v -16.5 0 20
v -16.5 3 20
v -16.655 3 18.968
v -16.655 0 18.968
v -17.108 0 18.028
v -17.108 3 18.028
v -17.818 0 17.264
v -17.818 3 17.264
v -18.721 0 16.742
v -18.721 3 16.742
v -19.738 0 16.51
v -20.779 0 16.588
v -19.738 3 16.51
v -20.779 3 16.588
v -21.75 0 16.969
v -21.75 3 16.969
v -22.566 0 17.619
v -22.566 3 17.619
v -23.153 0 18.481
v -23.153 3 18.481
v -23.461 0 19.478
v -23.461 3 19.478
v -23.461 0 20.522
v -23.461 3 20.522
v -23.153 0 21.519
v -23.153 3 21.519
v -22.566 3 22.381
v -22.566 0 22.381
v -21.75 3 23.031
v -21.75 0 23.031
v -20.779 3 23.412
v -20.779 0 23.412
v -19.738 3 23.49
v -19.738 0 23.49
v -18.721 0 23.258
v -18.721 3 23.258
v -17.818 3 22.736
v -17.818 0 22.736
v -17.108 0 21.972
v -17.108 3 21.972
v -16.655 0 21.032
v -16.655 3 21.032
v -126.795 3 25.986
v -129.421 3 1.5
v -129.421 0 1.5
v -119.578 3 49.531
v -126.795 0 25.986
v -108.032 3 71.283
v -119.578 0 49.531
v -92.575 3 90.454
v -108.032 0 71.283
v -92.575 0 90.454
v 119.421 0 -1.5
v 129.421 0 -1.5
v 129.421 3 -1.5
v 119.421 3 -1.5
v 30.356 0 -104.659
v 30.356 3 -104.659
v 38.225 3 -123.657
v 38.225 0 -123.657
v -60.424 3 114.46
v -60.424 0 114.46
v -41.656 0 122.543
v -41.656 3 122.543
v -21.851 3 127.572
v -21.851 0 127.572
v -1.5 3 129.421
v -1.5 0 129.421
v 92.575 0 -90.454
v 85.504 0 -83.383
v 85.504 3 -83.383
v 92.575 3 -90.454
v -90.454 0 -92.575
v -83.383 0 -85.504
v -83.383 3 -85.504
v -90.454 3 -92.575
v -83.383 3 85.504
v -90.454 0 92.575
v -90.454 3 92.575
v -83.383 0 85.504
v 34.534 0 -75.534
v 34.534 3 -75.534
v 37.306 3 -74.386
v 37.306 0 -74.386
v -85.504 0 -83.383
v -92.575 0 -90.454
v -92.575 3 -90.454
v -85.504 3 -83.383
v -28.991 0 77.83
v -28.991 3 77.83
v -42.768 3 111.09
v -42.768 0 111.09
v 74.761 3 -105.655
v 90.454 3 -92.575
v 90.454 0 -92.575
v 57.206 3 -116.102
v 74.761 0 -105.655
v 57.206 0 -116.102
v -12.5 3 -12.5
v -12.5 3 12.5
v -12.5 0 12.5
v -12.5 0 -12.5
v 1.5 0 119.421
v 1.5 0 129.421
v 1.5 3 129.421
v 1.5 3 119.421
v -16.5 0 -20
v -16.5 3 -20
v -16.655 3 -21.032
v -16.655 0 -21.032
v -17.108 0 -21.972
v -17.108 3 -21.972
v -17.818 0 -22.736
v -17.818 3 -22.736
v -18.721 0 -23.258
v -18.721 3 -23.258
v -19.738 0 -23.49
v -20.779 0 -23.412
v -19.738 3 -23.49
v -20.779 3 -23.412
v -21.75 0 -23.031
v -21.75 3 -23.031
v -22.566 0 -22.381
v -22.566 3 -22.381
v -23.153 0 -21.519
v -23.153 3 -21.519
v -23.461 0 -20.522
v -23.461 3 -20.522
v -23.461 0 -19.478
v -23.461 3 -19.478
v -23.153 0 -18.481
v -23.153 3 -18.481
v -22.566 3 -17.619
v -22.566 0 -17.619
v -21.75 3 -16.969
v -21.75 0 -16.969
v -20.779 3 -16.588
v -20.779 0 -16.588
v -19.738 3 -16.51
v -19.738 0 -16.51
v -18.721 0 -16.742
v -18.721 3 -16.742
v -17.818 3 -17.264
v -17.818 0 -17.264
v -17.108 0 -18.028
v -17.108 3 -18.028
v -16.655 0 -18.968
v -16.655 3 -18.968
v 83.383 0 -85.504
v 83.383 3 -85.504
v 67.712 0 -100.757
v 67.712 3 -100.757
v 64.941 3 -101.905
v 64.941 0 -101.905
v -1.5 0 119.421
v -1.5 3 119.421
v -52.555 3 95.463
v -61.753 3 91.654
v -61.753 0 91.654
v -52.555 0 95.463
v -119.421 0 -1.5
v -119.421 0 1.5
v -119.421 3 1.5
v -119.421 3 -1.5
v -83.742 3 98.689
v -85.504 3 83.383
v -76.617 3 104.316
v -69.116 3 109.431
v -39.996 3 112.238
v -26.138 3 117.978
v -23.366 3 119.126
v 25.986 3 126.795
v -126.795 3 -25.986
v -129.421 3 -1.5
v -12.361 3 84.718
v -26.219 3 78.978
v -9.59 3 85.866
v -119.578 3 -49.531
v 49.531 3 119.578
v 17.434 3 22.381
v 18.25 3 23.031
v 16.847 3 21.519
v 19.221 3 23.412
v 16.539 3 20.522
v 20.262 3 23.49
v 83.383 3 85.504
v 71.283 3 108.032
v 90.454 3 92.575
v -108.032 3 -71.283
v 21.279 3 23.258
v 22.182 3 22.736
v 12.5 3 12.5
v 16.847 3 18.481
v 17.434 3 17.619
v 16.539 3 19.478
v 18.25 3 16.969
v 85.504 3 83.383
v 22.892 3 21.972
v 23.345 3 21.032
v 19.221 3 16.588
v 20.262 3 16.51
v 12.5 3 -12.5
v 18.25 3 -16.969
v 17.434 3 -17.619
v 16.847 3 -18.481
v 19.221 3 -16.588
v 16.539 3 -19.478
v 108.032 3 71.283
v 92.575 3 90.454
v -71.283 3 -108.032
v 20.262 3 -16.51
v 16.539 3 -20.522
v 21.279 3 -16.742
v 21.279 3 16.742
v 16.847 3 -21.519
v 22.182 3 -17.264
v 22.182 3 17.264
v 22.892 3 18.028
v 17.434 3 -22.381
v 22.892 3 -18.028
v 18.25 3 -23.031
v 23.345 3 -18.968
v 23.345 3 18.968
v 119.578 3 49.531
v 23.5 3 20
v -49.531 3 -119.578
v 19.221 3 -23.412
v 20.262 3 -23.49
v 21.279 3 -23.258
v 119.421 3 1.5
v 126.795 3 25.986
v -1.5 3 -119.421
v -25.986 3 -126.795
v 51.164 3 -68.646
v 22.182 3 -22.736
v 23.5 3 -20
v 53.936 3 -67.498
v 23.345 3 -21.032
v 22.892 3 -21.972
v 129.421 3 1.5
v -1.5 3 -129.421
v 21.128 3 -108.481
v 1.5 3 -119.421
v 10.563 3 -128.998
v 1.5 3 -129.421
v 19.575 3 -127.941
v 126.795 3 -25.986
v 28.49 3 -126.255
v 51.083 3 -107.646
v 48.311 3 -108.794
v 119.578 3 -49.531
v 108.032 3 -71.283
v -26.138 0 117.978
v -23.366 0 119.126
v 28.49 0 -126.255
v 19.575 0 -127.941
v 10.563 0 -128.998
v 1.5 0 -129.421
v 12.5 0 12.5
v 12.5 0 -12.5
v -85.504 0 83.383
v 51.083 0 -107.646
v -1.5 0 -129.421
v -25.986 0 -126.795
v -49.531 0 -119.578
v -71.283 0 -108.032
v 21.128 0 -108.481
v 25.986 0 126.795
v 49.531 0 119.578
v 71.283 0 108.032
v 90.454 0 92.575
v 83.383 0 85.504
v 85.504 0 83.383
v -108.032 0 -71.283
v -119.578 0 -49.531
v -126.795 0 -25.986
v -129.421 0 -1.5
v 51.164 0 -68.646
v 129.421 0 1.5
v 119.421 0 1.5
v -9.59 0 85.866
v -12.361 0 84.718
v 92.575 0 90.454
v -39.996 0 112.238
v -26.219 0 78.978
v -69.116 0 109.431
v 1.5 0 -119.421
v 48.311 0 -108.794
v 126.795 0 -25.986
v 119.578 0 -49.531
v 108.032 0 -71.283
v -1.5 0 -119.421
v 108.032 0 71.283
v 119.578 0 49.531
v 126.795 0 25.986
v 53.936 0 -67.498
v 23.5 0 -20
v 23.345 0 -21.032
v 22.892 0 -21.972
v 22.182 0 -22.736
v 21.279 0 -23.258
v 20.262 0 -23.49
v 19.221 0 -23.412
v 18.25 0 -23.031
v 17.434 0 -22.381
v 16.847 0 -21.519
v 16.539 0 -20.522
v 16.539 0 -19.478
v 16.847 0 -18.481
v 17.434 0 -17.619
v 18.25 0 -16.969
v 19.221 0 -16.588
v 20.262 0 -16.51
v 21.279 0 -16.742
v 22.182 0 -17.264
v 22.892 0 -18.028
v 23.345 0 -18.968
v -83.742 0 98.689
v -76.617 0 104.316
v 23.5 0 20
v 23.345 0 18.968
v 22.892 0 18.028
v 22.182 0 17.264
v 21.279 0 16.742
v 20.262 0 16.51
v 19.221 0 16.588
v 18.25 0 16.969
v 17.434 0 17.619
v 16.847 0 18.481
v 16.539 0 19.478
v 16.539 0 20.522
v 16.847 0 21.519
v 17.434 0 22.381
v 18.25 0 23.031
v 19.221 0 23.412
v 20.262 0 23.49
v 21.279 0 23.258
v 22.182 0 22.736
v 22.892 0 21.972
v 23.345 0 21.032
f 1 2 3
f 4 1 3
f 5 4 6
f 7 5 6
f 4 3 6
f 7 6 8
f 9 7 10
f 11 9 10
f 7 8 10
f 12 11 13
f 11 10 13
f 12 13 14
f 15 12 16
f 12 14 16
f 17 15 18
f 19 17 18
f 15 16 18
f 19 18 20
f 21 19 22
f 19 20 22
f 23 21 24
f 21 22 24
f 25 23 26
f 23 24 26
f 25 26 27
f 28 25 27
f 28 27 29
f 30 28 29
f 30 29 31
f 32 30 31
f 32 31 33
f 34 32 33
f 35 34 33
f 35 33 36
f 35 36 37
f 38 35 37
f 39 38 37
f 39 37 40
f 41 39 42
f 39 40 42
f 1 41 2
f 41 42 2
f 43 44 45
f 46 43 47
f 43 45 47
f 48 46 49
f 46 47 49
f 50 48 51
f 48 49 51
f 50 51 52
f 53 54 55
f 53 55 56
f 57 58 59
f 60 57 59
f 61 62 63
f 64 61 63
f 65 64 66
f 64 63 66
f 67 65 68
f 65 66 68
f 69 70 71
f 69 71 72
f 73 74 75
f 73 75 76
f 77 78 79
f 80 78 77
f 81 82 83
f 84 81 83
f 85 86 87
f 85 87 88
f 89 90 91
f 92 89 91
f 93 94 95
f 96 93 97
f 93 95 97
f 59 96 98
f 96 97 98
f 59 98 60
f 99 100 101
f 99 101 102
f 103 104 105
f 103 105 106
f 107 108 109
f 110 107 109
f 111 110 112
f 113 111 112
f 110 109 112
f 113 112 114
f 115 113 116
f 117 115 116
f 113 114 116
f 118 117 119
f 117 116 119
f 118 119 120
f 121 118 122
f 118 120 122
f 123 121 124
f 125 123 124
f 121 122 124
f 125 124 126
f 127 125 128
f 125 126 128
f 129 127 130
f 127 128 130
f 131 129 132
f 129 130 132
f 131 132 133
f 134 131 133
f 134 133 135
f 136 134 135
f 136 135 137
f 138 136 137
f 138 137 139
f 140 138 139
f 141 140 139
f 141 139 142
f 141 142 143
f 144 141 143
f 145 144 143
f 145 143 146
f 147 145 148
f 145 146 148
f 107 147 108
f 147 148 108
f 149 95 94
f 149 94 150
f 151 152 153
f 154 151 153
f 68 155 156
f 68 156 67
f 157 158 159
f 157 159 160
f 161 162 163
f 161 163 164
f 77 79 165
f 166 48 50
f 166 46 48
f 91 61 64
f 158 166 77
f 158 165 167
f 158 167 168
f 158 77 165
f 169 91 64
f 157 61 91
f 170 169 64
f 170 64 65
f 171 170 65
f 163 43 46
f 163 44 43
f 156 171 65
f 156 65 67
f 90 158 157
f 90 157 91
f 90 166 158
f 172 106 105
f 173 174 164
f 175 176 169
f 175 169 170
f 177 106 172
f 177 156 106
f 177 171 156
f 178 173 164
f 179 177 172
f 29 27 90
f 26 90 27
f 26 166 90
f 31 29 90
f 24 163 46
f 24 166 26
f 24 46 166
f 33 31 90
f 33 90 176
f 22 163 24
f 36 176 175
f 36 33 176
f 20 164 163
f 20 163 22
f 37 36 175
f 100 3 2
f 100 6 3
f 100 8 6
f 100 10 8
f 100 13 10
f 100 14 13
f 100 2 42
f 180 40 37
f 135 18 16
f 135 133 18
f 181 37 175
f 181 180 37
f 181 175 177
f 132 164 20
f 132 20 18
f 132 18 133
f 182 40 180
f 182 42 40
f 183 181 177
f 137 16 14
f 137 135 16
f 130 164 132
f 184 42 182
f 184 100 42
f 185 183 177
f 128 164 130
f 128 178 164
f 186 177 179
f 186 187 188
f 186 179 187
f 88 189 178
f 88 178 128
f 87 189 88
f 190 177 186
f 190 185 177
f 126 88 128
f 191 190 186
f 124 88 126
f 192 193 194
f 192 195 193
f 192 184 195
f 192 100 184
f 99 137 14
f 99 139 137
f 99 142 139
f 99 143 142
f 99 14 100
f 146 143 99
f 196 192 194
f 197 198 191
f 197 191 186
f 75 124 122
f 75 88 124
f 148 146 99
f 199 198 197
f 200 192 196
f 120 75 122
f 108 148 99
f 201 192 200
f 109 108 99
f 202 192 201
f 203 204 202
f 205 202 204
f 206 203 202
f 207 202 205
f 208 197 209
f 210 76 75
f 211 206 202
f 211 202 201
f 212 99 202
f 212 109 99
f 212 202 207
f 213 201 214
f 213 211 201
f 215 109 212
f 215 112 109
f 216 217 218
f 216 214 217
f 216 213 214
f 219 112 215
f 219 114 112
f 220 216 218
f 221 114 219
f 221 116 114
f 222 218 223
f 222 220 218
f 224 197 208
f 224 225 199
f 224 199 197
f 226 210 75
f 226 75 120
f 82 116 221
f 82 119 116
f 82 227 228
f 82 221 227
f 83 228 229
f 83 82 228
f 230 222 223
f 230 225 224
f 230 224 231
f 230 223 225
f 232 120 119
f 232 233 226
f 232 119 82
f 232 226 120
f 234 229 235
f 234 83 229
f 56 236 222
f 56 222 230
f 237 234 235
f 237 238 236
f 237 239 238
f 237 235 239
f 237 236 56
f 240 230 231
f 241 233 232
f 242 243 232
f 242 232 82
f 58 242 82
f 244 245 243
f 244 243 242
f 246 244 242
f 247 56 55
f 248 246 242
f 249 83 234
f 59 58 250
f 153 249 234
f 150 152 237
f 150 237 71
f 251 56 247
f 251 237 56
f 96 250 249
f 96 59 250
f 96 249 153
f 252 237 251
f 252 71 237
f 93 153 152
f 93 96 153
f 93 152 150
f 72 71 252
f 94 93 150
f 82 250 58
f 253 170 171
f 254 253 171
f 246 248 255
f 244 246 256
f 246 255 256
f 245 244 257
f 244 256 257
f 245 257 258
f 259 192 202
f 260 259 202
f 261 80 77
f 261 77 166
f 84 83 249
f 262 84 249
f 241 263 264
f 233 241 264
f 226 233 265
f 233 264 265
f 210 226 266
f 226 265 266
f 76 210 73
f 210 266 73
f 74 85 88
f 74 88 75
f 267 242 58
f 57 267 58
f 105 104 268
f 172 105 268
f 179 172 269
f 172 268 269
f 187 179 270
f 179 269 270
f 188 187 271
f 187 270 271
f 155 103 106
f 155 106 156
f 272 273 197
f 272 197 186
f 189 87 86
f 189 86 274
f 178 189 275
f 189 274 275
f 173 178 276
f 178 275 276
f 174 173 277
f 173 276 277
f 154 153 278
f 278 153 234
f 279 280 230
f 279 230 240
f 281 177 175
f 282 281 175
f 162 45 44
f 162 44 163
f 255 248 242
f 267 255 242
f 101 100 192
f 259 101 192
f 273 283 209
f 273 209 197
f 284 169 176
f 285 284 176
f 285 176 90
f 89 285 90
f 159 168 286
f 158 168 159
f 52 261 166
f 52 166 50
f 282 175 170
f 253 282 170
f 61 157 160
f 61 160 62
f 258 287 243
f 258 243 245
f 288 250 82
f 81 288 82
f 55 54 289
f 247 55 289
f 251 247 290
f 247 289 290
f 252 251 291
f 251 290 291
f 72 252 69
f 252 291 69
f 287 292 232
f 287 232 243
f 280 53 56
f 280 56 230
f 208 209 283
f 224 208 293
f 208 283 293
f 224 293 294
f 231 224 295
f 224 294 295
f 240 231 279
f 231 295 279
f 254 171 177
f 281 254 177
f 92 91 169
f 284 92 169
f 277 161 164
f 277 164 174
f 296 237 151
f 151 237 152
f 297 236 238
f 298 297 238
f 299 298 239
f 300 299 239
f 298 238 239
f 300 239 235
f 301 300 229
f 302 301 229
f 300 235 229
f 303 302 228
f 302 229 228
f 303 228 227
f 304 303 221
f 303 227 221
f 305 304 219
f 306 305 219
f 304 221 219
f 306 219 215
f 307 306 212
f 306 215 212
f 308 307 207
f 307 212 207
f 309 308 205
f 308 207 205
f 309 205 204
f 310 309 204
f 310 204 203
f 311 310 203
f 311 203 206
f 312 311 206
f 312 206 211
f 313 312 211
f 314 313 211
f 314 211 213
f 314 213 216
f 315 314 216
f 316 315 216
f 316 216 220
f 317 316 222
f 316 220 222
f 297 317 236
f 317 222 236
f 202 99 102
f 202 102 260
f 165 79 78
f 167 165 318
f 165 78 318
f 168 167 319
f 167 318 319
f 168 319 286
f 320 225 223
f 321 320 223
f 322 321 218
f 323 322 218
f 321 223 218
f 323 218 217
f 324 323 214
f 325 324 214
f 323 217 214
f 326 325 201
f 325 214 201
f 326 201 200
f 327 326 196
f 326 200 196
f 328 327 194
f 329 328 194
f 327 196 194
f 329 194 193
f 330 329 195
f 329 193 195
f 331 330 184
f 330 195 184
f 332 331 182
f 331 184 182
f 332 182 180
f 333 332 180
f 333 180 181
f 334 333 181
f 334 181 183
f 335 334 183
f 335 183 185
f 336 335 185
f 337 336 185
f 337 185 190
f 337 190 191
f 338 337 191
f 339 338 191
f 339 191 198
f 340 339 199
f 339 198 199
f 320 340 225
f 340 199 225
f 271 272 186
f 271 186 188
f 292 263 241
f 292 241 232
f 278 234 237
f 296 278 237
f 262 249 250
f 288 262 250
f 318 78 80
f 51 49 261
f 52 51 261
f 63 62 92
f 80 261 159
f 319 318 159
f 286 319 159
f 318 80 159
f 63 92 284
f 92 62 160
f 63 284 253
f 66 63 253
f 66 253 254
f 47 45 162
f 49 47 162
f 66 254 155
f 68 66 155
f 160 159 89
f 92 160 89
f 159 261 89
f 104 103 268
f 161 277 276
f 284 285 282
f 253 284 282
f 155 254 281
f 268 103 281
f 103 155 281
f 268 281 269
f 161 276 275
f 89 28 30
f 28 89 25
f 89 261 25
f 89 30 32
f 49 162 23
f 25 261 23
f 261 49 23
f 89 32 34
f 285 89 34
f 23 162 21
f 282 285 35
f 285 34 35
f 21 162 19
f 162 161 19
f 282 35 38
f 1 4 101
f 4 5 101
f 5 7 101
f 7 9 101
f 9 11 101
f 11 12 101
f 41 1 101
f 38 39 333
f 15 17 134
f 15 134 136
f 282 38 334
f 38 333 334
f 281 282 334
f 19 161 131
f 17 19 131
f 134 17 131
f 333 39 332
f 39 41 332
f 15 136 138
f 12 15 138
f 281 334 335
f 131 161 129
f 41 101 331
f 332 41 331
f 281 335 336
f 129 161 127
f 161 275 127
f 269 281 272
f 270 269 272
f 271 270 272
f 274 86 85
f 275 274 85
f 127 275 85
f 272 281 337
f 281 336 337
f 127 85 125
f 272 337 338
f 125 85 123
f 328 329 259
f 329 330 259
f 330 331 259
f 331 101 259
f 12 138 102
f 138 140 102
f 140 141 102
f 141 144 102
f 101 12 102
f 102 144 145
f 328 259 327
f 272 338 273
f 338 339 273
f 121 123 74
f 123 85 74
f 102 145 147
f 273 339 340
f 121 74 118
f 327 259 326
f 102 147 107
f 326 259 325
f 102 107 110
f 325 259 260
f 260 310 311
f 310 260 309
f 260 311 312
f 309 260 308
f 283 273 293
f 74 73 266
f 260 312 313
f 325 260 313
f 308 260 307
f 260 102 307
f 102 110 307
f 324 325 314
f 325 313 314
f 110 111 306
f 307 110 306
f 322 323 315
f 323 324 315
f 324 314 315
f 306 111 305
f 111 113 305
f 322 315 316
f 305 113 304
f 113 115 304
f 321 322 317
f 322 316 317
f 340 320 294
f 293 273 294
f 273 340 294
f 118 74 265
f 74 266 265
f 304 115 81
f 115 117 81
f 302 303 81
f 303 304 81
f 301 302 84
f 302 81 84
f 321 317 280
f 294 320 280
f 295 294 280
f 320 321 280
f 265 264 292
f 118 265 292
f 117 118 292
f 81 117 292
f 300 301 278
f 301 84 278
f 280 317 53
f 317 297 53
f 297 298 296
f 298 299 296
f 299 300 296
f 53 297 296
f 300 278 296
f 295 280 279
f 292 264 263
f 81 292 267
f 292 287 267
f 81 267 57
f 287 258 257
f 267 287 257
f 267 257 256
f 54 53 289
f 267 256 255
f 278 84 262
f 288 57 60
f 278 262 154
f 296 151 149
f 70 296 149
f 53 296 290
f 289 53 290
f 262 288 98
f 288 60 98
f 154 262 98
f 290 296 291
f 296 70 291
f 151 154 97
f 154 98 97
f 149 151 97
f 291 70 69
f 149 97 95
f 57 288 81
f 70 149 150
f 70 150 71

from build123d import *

# Parameters (mm, degrees)
SKETCH1_R               = 129.43
BOSS_EXTRUDE1_DEPTH     = 3
CUT_EXTRUDE2_START      = -3
CUT_EXTRUDE2_DEPTH      = 4
CIRPATTERN1_COUNT       = 8
SKETCH4_R               = 3.5
SKETCH4_W               = 25
SKETCH4_H               = 25
CUT_EXTRUDE3_DEPTH      = 3
CUT_EXTRUDE4_DEPTH      = 10
CUT_EXTRUDE5_DEPTH      = 1
CUT_EXTRUDE5_DEPTH_BACK = 3
CUT_EXTRUDE6_DEPTH      = 1
CUT_EXTRUDE6_DEPTH_BACK = 3


with BuildPart() as part:
    # Sketch1 → Boss-Extrude1 (new body)
    with BuildSketch(Plane(origin=(0, 0, 0), x_dir=(1, 0, 0), z_dir=(0, 1, 0))):
        Circle(SKETCH1_R)
    extrude(amount=BOSS_EXTRUDE1_DEPTH)

    # Sketch2 → Cut-Extrude2 (cut)
    with BuildSketch(Plane(origin=(0, 3, 0), x_dir=(1, 0, 0), z_dir=(0, 1, 0)).offset(CUT_EXTRUDE2_START)):
        Polygon((-1.5, 719.582197244), (-1.5, 129.421307751), (-1.5, 119.421307751), (1.5, 119.421307751), (1.5, 129.421307751), (1.5, 719.582197244), (1.5, 1899.903976231), (-1.5, 1899.903976231), align=None)
    cut_extrude2 = extrude(amount=CUT_EXTRUDE2_DEPTH, mode=Mode.SUBTRACT)

    # CirPattern1: Cut-Extrude2 ×8 about axis
    cirpattern1_axis = Axis((0, 0, 0), (0, -1, 0))
    for i in range(1, CIRPATTERN1_COUNT):
        add(cut_extrude2.rotate(cirpattern1_axis, i * 360 / CIRPATTERN1_COUNT), mode=Mode.SUBTRACT)

    # Sketch4 → Cut-Extrude3 (cut)
    with BuildSketch(Plane(origin=(0, 3, 0), x_dir=(1, 0, 0), z_dir=(0, 1, 0))):
        with Locations((20, 20)):
            Circle(SKETCH4_R)
        with Locations((20, -20)):
            Circle(SKETCH4_R)
        with Locations((-20, -20)):
            Circle(SKETCH4_R)
        with Locations((-20, 20)):
            Circle(SKETCH4_R)
        Rectangle(SKETCH4_W, SKETCH4_H)
    extrude(amount=-CUT_EXTRUDE3_DEPTH, mode=Mode.SUBTRACT)

    # Sketch5 → Cut-Extrude4 (cut)
    with BuildSketch(Plane(origin=(0, 3, 0), x_dir=(1, 0, 0), z_dir=(0, 1, 0))):
        Polygon((-42.767689854, -111.089714666), (-39.996051256, -112.237764963), (-26.219447691, -78.978101793), (-28.991086289, -77.830051496), align=None)
        Polygon((-26.137858269, -117.978016449), (-23.366219671, -119.126066746), (-9.589616106, -85.866403575), (-12.361254704, -84.718353278), align=None)
        Polygon((53.935833667, 67.497598822), (67.712437232, 100.757261992), (64.940798634, 101.905312289), (51.164195069, 68.645649119), align=None)
        Polygon((37.306002081, 74.385900604), (51.082605647, 107.645563775), (48.310967049, 108.793614072), (34.534363484, 75.533950901), align=None)
    extrude(amount=-CUT_EXTRUDE4_DEPTH, mode=Mode.SUBTRACT)

    # Sketch6 → Cut-Extrude5 (cut, two sides)
    with BuildSketch(Plane(origin=(0, 3, 0), x_dir=(1, 0, 0), z_dir=(0, 1, 0))) as cut_extrude5_sk:
        Polygon((264.658286272, 696.415643975), (28.490193223, 126.255430735), (21.127814063, 108.481075117), (30.356179145, 104.658561141), (38.225405343, 123.656553754), (274.393498392, 693.816766994), (592.742329798, 1886.329311701), (583.007117678, 1888.928188682), align=None)
    extrude(amount=CUT_EXTRUDE5_DEPTH, mode=Mode.SUBTRACT)
    extrude(cut_extrude5_sk.sketch, amount=-CUT_EXTRUDE5_DEPTH_BACK, mode=Mode.SUBTRACT)

    # Sketch8 → Cut-Extrude6 (cut, two sides)
    with BuildSketch(Plane(origin=(0, 3, 0), x_dir=(1, 0, 0), z_dir=(0, 1, 0))) as cut_extrude6_sk:
        Polygon((-310.659690478, -692.568815319), (-69.116017705, -109.430804605), (-61.752527909, -91.653767674), (-52.555273509, -95.463395183), (-60.423899034, -114.459937644), (-301.967571807, -697.597948358), (-934.16352501, -1790.255908717), (-942.855643681, -1785.226775678), align=None)
    extrude(amount=CUT_EXTRUDE6_DEPTH, mode=Mode.SUBTRACT)
    extrude(cut_extrude6_sk.sketch, amount=-CUT_EXTRUDE6_DEPTH_BACK, mode=Mode.SUBTRACT)


solid = part.part
